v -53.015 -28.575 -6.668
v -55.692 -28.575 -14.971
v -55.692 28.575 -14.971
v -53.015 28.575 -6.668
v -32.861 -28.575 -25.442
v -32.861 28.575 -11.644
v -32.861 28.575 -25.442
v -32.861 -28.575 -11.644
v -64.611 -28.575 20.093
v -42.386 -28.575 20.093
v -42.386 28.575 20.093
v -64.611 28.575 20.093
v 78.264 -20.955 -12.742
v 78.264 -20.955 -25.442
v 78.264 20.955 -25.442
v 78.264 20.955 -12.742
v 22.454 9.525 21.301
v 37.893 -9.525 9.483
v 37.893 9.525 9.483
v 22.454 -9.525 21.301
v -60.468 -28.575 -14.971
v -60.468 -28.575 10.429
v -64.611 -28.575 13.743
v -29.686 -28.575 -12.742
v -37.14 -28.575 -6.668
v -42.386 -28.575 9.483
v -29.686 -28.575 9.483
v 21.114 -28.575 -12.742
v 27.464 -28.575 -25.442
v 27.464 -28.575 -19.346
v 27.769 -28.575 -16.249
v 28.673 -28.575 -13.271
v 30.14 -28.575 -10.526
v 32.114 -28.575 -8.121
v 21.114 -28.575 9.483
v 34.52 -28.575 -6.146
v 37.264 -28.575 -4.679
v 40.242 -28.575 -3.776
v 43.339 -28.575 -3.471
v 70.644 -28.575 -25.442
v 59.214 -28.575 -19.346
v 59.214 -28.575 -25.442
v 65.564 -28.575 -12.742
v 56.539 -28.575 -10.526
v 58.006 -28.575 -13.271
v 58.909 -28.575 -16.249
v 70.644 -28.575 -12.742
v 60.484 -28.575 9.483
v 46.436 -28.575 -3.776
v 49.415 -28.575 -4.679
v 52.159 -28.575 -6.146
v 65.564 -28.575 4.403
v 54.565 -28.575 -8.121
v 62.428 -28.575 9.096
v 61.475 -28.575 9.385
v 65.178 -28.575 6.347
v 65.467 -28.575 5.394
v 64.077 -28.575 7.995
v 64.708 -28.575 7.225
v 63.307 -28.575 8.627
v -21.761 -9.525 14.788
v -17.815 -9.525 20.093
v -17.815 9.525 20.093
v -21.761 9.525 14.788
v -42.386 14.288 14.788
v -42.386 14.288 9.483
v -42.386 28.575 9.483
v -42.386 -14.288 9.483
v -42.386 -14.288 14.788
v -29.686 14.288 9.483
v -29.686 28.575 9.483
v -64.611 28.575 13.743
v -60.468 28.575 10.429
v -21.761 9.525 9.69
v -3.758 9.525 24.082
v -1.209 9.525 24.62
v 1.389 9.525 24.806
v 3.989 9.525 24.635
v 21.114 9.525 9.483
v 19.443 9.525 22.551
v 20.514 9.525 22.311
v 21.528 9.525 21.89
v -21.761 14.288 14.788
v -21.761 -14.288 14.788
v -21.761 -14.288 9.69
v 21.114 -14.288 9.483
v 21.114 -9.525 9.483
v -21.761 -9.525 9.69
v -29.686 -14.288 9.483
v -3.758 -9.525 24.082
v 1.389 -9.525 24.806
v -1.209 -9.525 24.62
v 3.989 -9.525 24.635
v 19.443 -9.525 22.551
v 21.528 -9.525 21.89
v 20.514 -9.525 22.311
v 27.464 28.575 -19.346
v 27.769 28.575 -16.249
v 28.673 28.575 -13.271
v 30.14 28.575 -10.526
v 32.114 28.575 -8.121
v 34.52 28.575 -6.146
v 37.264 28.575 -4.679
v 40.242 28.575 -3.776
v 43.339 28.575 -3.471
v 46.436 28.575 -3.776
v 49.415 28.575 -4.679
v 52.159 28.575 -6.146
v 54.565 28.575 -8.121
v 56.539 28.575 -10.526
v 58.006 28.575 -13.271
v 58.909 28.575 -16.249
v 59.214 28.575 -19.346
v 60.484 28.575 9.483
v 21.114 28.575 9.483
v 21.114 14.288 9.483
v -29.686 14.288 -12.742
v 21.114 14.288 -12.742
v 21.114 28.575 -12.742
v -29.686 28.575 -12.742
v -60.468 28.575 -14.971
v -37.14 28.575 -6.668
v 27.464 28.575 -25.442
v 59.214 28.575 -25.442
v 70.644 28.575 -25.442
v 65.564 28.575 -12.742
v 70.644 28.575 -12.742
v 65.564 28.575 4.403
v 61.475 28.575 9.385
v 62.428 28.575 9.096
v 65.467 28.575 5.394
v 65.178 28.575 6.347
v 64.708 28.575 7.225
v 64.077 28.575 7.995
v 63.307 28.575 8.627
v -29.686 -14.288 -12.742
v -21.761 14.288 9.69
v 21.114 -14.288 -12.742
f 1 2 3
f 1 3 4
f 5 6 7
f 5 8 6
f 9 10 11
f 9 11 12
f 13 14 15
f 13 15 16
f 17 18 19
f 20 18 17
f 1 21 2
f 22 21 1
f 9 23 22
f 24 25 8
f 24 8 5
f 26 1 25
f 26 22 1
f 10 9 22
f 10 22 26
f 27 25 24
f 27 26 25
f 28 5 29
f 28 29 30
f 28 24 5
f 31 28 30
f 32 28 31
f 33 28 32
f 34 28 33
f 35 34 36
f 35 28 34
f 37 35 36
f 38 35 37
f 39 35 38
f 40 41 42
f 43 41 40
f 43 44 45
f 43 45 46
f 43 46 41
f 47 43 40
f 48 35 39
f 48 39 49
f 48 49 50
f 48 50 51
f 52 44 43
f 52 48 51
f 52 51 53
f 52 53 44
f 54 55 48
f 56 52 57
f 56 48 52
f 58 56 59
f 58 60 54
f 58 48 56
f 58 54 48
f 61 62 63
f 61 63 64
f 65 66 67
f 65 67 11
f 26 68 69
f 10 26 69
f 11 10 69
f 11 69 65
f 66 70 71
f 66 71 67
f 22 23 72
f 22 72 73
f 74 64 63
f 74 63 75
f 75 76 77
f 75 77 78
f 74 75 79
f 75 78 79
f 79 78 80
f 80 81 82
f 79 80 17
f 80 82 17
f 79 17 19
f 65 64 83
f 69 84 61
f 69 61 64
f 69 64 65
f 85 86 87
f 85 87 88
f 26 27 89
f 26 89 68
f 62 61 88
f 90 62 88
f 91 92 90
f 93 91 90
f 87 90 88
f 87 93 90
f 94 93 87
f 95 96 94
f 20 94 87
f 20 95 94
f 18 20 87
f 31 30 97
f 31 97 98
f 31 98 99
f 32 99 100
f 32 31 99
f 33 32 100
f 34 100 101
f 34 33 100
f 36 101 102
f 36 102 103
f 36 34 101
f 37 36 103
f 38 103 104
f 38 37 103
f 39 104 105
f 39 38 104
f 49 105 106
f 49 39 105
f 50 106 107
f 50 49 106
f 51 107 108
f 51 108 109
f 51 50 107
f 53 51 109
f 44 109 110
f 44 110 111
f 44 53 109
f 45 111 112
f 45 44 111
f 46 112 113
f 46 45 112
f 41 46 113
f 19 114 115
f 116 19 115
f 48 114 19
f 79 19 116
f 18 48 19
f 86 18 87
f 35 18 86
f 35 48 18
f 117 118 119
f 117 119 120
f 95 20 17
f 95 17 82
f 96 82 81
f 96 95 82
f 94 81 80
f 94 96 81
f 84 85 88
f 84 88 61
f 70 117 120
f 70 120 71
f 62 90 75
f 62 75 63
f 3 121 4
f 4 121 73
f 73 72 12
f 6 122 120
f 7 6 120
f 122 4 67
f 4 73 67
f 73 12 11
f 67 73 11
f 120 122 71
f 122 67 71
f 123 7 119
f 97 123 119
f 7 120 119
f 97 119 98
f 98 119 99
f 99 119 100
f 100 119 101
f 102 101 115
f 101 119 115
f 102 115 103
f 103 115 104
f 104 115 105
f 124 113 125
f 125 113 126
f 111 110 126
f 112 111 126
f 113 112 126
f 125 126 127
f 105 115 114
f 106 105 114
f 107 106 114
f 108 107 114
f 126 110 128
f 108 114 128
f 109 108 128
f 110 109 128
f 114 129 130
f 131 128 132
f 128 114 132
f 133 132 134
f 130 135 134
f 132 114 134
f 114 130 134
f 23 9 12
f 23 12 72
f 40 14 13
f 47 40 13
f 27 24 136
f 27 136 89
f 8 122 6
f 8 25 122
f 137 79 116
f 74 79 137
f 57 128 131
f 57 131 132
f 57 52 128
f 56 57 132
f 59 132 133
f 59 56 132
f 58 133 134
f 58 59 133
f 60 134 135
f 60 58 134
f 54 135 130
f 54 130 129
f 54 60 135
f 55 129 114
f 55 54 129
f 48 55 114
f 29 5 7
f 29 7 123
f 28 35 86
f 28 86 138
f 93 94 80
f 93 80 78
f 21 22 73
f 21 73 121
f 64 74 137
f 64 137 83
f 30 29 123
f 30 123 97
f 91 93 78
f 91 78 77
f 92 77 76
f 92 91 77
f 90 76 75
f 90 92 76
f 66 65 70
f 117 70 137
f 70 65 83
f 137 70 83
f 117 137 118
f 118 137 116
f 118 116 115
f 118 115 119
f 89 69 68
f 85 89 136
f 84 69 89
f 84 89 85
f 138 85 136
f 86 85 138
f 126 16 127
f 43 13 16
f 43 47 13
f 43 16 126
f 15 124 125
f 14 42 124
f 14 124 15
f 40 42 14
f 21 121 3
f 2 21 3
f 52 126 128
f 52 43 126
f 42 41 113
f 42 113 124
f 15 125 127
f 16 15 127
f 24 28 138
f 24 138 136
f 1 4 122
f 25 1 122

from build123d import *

# Parameters (mm, degrees)
F1_DEPTH = 28.575
F2_DEPTH = 14.2875
F3_DEPTH = 14.2875
F4_R     = 5.08
F5_DEPTH = 9.525
F6_SIZE  = 7.62


with BuildPart() as f1:
    # F0 (on Front) → F1 (new body, symmetric)
    with BuildSketch(Plane.XZ):
        with BuildLine():
            Line((-32.86058, -11.644275), (-32.86058, -25.442014))
            Line((-32.86058, -25.442014), (27.46442, -25.442014))
            Line((27.46442, -25.442014), (27.46442, -19.346014))
            ThreePointArc((27.46442, -19.346014), (43.33942, -3.471014), (59.21442, -19.346014))
            Line((59.21442, -19.346014), (59.21442, -25.442014))
            Line((59.21442, -25.442014), (78.26442, -25.442014))
            Line((78.26442, -25.442014), (78.26442, -18.228882))
            Line((78.26442, -18.228882), (78.26442, -12.742014))
            Line((78.26442, -12.742014), (65.56442, -12.742014))
            Line((65.56442, -12.742014), (65.56442, 9.482986))
            Line((65.56442, 9.482986), (37.893278, 9.482986))
            Line((37.893278, 9.482986), (21.11442, 9.482986))
            Line((21.11442, 9.482986), (21.11442, -12.742014))
            Line((21.11442, -12.742014), (-29.68558, -12.742014))
            Line((-29.68558, -12.742014), (-29.68558, 9.482986))
            Line((-29.68558, 9.482986), (-42.38558, 9.482986))
            Line((-42.38558, 9.482986), (-42.38558, 14.788094))
            Line((-42.38558, 14.788094), (-42.38558, 20.093201))
            Line((-42.38558, 20.093201), (-64.61058, 20.093201))
            Line((-64.61058, 20.093201), (-64.61058, 13.743201))
            Line((-64.61058, 13.743201), (-60.467657, 10.428858))
            Line((-60.467657, 10.428858), (-60.467657, -14.971142))
            Line((-60.467657, -14.971142), (-55.692457, -14.971142))
            Line((-55.692457, -14.971142), (-53.014755, -6.6675))
            Line((-53.014755, -6.6675), (-37.139755, -6.6675))
            Line((-37.139755, -6.6675), (-32.86058, -11.644275))
        make_face()
    extrude(amount=F1_DEPTH, both=True)

    # F0 (on Front) → F2 (join, symmetric)
    with BuildSketch(Plane.XZ):
        Polygon((21.11442, -12.742014), (21.11442, 9.482986), (-21.76078, 9.690133), (-29.68558, 9.482986), (-29.68558, -12.742014), align=None)
    extrude(amount=F2_DEPTH, both=True)

    # F0 (on Front) → F3 (join, symmetric)
    with BuildSketch(Plane.XZ):
        Polygon((-21.76078, 14.788094), (-42.38558, 14.788094), (-42.38558, 9.482986), (-29.68558, 9.482986), (-21.76078, 9.690133), align=None)
    extrude(amount=F3_DEPTH, both=True)

    # F4
    f4_edges = [f1.edges().sort_by_distance(p)[0] for p in [
        (65.56442, 0, 9.482986),
    ]]
    fillet(f4_edges, radius=F4_R)

    # F0 (on Front) → F5 (join, symmetric)
    with BuildSketch(Plane.XZ):
        with BuildLine():
            Line((21.11442, 9.482986), (37.893278, 9.482986))
            Line((37.893278, 9.482986), (22.453869, 21.300806))
            ThreePointArc((22.453869, 21.300806), (21.02995, 22.122689), (19.442752, 22.551457))
            Line((19.442752, 22.551457), (3.988611, 24.635159))
            ThreePointArc((3.988611, 24.635159), (0.087031, 24.757666), (-3.75761, 24.082341))
            Line((-3.75761, 24.082341), (-17.814589, 20.093201))
            Line((-17.814589, 20.093201), (-21.76078, 14.788094))
            Line((-21.76078, 14.788094), (-21.76078, 9.690133))
            Line((-21.76078, 9.690133), (21.11442, 9.482986))
        make_face()
    extrude(amount=F5_DEPTH, both=True)

    # F6
    f6_edges = [f1.edges().sort_by_distance(p)[0] for p in [
        (78.26442, -28.575, -19.092014),
        (78.26442, 28.575, -19.092014),
    ]]
    chamfer(f6_edges, length=F6_SIZE)


solid = f1.part
